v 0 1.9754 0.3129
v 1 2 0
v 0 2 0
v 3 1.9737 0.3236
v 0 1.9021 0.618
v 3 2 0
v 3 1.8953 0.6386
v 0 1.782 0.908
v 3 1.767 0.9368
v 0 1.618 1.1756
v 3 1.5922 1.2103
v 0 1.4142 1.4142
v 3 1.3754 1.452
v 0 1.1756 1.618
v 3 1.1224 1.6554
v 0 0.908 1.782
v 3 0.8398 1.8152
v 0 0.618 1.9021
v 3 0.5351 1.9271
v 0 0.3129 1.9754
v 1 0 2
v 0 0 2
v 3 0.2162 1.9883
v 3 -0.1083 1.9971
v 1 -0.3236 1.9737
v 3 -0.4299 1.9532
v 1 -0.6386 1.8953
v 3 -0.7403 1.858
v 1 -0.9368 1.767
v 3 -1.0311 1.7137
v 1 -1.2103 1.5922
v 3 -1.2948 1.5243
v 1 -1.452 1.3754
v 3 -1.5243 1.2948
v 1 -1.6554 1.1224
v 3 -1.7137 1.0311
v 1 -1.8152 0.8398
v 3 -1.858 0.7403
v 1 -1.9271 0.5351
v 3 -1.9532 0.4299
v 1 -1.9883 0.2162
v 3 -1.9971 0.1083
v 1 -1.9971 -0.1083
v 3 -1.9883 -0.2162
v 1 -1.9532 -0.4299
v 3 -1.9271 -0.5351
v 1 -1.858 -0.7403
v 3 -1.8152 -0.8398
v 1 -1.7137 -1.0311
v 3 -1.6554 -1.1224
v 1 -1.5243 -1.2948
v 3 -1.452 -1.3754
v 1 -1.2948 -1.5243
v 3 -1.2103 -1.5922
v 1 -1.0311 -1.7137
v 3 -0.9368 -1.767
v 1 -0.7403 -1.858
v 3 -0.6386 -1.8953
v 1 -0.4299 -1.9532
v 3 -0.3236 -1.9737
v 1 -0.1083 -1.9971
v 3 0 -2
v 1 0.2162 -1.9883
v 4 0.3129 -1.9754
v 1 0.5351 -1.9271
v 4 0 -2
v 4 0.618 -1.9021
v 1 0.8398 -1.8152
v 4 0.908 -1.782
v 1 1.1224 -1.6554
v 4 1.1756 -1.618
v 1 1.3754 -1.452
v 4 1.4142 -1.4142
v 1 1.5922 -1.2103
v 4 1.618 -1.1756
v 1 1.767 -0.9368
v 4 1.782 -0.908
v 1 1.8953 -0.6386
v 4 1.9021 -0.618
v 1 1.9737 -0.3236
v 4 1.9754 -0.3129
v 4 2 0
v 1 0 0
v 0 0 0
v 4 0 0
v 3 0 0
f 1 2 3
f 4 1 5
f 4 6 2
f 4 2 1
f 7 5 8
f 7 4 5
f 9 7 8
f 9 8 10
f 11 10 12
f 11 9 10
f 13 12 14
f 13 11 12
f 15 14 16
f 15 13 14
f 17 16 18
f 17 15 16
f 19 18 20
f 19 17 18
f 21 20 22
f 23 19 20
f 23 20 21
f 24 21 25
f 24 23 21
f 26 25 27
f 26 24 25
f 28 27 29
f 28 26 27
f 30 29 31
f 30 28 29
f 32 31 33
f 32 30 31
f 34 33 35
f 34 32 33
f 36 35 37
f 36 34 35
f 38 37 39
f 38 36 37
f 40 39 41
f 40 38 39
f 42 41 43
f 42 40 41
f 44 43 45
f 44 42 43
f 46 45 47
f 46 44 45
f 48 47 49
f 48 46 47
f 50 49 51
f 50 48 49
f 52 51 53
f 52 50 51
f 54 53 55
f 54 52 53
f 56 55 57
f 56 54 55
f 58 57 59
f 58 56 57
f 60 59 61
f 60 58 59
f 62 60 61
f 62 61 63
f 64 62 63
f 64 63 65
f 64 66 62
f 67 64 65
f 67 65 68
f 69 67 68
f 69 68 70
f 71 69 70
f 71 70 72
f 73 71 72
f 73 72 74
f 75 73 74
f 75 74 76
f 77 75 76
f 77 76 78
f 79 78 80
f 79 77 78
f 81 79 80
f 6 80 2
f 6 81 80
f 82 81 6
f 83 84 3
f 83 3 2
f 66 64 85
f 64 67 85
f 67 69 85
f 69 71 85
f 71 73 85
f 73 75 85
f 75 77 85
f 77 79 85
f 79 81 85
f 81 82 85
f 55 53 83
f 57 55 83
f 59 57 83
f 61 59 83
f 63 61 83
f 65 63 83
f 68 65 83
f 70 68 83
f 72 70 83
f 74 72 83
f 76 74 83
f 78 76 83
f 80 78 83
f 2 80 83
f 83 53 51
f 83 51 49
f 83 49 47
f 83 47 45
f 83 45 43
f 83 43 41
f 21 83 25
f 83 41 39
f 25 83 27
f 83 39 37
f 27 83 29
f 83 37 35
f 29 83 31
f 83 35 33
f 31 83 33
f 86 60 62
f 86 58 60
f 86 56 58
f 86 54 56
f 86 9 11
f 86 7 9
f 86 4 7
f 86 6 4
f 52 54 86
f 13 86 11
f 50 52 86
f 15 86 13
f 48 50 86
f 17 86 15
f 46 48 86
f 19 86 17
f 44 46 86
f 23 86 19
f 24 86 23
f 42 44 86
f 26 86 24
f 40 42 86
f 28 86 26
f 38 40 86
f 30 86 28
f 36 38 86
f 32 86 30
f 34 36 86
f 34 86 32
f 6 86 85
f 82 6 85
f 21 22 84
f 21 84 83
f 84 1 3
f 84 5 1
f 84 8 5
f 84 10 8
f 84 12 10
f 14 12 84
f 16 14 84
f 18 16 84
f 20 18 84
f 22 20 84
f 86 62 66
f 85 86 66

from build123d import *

# Parameters (mm, degrees)
SKETCH5_W          = 4
SKETCH5_H          = 2
SKETCH6_W          = 1
SKETCH6_H          = 2
CUT_EXTRUDE5_DEPTH = 5.5
SKETCH7_W          = 1
SKETCH7_H          = 2
CUT_EXTRUDE6_DEPTH = 10


with BuildPart() as part:
    # Sketch5 → Revolve-Thin2 (revolve)
    with BuildSketch(Plane.XY):
        with Locations((2, 1)):
            Rectangle(SKETCH5_W, SKETCH5_H)
    revolve(axis=Axis((0, 0, 0), (1, 0, 0)))

    # Sketch6 → Cut-Extrude5 (cut, symmetric)
    with BuildSketch(Plane.XY):
        with Locations((3.5, -1)):
            Rectangle(SKETCH6_W, SKETCH6_H)
        with Locations((0.5, -1)):
            Rectangle(SKETCH6_W, SKETCH6_H)
    extrude(amount=CUT_EXTRUDE5_DEPTH, both=True, mode=Mode.SUBTRACT)

    # Sketch7 → Cut-Extrude6 (cut)
    with BuildSketch(Plane.XZ):
        with Locations((0.5, -1)):
            Rectangle(SKETCH7_W, SKETCH7_H)
        with Locations((3.5, 1)):
            Rectangle(SKETCH7_W, SKETCH7_H)
    extrude(amount=-CUT_EXTRUDE6_DEPTH, mode=Mode.SUBTRACT)


solid = part.part
